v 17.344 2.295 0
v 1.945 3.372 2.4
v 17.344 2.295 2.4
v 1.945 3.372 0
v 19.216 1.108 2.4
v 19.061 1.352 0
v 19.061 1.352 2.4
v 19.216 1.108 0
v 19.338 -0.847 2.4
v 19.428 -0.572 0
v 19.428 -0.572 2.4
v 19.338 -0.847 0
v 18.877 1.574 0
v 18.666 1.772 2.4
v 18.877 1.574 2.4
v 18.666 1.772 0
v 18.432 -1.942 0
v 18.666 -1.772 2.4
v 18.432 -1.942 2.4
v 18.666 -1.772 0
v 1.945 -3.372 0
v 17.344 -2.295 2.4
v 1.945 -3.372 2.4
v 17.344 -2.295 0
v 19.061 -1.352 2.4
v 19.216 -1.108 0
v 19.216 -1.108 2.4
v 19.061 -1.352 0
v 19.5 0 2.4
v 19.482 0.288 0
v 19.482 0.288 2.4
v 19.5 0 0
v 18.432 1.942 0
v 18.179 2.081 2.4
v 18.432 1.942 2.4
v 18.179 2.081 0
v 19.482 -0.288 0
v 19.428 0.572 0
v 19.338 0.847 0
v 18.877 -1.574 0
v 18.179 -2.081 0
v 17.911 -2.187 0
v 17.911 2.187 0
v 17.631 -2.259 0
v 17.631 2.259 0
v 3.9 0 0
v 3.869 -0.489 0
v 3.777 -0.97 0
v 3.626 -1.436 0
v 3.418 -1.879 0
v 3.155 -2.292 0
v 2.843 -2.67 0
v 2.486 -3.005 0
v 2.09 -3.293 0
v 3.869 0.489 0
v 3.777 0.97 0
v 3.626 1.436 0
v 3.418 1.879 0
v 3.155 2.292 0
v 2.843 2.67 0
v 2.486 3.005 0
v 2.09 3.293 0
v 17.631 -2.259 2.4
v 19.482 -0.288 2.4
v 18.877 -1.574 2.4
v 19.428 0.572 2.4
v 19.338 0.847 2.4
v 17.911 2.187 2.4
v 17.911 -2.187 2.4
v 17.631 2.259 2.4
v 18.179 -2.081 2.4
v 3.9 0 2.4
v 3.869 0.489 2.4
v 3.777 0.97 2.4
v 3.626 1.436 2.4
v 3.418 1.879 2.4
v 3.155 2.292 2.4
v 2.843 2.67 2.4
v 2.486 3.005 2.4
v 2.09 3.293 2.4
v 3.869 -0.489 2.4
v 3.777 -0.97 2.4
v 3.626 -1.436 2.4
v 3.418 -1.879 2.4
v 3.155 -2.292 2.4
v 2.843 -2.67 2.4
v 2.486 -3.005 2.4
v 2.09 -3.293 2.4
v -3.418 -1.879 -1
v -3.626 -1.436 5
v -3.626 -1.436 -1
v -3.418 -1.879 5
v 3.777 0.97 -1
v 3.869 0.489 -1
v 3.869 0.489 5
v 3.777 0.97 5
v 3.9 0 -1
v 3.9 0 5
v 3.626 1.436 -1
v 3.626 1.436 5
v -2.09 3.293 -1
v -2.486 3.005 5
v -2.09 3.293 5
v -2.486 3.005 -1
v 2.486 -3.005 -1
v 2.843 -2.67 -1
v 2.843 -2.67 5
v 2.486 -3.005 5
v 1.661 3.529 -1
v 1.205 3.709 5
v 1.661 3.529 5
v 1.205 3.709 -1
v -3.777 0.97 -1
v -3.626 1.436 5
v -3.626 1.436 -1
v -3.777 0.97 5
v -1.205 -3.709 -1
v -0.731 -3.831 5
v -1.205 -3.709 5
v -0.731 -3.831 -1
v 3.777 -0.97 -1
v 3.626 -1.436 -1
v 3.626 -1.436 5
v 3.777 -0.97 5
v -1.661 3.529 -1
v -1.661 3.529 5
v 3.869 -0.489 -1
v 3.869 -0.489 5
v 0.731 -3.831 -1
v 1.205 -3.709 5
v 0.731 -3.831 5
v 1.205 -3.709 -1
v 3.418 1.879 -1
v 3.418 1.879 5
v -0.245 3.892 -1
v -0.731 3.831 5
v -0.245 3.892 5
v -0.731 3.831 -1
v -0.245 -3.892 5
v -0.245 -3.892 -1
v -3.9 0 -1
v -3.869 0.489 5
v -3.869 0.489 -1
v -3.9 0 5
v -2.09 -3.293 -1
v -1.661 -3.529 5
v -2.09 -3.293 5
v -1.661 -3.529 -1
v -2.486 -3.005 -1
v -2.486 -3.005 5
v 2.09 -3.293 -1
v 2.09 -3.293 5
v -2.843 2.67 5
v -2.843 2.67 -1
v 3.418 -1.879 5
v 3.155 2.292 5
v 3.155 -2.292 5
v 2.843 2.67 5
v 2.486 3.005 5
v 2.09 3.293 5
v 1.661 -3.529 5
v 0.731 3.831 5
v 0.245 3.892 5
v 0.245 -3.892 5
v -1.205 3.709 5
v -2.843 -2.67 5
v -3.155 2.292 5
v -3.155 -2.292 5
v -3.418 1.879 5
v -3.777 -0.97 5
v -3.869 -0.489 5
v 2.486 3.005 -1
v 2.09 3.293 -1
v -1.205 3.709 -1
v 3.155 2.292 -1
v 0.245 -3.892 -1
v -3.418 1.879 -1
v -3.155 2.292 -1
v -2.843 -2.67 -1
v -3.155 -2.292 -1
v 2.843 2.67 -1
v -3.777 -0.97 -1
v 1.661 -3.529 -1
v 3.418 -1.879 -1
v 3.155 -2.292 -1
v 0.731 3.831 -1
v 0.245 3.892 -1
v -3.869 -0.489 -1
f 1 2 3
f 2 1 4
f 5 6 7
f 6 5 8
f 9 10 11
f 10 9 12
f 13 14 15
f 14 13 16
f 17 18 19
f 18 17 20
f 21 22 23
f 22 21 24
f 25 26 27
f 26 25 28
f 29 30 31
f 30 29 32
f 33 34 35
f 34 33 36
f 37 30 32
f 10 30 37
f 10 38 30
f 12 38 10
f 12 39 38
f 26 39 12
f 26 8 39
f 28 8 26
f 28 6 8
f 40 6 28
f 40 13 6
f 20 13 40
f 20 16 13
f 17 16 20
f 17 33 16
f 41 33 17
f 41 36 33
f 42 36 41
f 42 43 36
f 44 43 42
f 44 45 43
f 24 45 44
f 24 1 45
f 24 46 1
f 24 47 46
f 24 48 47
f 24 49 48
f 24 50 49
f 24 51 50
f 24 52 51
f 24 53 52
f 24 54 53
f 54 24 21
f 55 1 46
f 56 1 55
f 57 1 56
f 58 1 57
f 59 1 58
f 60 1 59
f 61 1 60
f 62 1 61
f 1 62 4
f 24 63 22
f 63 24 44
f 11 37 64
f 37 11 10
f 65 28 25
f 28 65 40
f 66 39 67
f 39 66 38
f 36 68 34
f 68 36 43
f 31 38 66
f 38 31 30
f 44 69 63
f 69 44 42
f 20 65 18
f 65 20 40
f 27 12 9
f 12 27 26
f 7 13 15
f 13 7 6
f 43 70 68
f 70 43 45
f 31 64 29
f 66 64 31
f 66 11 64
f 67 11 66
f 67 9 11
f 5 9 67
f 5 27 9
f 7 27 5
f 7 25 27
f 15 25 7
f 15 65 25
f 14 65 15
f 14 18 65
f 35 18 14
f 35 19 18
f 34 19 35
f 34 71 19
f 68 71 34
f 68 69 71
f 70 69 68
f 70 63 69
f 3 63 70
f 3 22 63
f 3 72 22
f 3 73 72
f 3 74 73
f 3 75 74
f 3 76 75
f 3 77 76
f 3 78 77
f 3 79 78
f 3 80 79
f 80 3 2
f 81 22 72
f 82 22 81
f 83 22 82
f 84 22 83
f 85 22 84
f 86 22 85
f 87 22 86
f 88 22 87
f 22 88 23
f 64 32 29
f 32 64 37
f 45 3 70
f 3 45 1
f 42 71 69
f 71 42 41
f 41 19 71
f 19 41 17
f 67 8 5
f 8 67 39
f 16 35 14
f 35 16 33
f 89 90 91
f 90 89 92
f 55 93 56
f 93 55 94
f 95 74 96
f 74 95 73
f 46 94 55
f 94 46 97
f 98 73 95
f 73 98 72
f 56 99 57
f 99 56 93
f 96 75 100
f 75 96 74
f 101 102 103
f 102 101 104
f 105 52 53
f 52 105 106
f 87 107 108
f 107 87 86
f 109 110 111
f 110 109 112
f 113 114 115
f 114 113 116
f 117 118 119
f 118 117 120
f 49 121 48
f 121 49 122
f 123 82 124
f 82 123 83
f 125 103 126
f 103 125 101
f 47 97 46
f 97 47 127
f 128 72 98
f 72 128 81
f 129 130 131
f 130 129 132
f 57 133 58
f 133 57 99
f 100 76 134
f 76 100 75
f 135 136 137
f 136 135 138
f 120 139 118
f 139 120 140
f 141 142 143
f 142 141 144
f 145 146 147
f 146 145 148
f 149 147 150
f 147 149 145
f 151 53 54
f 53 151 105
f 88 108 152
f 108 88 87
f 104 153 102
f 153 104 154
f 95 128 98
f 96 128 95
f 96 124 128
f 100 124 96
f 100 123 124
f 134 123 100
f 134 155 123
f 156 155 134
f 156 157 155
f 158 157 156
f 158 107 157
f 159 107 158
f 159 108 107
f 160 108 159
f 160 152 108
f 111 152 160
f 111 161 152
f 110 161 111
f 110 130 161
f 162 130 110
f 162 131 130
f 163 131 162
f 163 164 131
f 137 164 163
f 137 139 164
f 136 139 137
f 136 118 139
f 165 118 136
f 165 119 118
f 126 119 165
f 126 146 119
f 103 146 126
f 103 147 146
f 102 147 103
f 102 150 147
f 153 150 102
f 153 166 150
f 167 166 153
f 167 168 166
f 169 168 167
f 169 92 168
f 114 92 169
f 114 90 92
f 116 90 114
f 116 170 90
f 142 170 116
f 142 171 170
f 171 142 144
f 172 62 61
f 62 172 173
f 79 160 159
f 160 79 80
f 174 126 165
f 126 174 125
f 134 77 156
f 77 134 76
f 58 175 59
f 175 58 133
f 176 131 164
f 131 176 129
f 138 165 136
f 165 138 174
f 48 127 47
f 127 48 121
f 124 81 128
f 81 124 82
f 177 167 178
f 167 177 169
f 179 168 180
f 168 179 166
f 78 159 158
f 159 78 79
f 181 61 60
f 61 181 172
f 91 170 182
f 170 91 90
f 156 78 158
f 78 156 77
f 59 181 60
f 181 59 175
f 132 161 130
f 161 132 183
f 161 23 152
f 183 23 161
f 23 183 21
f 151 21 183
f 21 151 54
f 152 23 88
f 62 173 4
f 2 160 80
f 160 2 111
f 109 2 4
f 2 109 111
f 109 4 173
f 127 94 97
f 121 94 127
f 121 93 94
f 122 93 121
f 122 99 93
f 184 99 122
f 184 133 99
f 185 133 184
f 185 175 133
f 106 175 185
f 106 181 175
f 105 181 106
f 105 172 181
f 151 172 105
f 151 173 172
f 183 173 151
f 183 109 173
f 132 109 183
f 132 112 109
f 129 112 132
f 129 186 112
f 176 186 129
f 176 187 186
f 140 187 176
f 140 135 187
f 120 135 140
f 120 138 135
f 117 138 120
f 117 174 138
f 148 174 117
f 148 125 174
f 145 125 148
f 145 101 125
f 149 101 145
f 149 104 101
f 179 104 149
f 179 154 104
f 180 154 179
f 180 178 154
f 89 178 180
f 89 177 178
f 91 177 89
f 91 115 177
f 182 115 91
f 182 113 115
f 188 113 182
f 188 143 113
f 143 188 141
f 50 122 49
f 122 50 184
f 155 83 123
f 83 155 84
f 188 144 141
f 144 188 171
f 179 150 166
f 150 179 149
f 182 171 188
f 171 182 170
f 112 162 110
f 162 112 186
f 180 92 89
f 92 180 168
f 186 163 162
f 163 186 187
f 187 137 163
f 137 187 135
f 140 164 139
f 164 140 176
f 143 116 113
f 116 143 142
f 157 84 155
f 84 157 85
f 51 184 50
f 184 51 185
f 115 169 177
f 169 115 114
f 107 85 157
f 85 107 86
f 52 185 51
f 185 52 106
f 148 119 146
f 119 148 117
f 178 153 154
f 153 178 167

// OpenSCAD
rad1 = 2.3;
rad2 = 3.5;
rad3 = 3.9;
height1 = 2.4;
height2 = 6;

$fn = 50;

axisMount();

module axisMount(){
	difference(){
		union(){
			hull(){
				cylinder(r=rad2, h=height1);				
				translate([23-rad1-rad2,0,0]){
					cylinder(r=rad1, h=height1);
				}
			}
			translate([0,0,-1]){
				cylinder(r=rad3, h=height2);
			}
		}
	}
}
